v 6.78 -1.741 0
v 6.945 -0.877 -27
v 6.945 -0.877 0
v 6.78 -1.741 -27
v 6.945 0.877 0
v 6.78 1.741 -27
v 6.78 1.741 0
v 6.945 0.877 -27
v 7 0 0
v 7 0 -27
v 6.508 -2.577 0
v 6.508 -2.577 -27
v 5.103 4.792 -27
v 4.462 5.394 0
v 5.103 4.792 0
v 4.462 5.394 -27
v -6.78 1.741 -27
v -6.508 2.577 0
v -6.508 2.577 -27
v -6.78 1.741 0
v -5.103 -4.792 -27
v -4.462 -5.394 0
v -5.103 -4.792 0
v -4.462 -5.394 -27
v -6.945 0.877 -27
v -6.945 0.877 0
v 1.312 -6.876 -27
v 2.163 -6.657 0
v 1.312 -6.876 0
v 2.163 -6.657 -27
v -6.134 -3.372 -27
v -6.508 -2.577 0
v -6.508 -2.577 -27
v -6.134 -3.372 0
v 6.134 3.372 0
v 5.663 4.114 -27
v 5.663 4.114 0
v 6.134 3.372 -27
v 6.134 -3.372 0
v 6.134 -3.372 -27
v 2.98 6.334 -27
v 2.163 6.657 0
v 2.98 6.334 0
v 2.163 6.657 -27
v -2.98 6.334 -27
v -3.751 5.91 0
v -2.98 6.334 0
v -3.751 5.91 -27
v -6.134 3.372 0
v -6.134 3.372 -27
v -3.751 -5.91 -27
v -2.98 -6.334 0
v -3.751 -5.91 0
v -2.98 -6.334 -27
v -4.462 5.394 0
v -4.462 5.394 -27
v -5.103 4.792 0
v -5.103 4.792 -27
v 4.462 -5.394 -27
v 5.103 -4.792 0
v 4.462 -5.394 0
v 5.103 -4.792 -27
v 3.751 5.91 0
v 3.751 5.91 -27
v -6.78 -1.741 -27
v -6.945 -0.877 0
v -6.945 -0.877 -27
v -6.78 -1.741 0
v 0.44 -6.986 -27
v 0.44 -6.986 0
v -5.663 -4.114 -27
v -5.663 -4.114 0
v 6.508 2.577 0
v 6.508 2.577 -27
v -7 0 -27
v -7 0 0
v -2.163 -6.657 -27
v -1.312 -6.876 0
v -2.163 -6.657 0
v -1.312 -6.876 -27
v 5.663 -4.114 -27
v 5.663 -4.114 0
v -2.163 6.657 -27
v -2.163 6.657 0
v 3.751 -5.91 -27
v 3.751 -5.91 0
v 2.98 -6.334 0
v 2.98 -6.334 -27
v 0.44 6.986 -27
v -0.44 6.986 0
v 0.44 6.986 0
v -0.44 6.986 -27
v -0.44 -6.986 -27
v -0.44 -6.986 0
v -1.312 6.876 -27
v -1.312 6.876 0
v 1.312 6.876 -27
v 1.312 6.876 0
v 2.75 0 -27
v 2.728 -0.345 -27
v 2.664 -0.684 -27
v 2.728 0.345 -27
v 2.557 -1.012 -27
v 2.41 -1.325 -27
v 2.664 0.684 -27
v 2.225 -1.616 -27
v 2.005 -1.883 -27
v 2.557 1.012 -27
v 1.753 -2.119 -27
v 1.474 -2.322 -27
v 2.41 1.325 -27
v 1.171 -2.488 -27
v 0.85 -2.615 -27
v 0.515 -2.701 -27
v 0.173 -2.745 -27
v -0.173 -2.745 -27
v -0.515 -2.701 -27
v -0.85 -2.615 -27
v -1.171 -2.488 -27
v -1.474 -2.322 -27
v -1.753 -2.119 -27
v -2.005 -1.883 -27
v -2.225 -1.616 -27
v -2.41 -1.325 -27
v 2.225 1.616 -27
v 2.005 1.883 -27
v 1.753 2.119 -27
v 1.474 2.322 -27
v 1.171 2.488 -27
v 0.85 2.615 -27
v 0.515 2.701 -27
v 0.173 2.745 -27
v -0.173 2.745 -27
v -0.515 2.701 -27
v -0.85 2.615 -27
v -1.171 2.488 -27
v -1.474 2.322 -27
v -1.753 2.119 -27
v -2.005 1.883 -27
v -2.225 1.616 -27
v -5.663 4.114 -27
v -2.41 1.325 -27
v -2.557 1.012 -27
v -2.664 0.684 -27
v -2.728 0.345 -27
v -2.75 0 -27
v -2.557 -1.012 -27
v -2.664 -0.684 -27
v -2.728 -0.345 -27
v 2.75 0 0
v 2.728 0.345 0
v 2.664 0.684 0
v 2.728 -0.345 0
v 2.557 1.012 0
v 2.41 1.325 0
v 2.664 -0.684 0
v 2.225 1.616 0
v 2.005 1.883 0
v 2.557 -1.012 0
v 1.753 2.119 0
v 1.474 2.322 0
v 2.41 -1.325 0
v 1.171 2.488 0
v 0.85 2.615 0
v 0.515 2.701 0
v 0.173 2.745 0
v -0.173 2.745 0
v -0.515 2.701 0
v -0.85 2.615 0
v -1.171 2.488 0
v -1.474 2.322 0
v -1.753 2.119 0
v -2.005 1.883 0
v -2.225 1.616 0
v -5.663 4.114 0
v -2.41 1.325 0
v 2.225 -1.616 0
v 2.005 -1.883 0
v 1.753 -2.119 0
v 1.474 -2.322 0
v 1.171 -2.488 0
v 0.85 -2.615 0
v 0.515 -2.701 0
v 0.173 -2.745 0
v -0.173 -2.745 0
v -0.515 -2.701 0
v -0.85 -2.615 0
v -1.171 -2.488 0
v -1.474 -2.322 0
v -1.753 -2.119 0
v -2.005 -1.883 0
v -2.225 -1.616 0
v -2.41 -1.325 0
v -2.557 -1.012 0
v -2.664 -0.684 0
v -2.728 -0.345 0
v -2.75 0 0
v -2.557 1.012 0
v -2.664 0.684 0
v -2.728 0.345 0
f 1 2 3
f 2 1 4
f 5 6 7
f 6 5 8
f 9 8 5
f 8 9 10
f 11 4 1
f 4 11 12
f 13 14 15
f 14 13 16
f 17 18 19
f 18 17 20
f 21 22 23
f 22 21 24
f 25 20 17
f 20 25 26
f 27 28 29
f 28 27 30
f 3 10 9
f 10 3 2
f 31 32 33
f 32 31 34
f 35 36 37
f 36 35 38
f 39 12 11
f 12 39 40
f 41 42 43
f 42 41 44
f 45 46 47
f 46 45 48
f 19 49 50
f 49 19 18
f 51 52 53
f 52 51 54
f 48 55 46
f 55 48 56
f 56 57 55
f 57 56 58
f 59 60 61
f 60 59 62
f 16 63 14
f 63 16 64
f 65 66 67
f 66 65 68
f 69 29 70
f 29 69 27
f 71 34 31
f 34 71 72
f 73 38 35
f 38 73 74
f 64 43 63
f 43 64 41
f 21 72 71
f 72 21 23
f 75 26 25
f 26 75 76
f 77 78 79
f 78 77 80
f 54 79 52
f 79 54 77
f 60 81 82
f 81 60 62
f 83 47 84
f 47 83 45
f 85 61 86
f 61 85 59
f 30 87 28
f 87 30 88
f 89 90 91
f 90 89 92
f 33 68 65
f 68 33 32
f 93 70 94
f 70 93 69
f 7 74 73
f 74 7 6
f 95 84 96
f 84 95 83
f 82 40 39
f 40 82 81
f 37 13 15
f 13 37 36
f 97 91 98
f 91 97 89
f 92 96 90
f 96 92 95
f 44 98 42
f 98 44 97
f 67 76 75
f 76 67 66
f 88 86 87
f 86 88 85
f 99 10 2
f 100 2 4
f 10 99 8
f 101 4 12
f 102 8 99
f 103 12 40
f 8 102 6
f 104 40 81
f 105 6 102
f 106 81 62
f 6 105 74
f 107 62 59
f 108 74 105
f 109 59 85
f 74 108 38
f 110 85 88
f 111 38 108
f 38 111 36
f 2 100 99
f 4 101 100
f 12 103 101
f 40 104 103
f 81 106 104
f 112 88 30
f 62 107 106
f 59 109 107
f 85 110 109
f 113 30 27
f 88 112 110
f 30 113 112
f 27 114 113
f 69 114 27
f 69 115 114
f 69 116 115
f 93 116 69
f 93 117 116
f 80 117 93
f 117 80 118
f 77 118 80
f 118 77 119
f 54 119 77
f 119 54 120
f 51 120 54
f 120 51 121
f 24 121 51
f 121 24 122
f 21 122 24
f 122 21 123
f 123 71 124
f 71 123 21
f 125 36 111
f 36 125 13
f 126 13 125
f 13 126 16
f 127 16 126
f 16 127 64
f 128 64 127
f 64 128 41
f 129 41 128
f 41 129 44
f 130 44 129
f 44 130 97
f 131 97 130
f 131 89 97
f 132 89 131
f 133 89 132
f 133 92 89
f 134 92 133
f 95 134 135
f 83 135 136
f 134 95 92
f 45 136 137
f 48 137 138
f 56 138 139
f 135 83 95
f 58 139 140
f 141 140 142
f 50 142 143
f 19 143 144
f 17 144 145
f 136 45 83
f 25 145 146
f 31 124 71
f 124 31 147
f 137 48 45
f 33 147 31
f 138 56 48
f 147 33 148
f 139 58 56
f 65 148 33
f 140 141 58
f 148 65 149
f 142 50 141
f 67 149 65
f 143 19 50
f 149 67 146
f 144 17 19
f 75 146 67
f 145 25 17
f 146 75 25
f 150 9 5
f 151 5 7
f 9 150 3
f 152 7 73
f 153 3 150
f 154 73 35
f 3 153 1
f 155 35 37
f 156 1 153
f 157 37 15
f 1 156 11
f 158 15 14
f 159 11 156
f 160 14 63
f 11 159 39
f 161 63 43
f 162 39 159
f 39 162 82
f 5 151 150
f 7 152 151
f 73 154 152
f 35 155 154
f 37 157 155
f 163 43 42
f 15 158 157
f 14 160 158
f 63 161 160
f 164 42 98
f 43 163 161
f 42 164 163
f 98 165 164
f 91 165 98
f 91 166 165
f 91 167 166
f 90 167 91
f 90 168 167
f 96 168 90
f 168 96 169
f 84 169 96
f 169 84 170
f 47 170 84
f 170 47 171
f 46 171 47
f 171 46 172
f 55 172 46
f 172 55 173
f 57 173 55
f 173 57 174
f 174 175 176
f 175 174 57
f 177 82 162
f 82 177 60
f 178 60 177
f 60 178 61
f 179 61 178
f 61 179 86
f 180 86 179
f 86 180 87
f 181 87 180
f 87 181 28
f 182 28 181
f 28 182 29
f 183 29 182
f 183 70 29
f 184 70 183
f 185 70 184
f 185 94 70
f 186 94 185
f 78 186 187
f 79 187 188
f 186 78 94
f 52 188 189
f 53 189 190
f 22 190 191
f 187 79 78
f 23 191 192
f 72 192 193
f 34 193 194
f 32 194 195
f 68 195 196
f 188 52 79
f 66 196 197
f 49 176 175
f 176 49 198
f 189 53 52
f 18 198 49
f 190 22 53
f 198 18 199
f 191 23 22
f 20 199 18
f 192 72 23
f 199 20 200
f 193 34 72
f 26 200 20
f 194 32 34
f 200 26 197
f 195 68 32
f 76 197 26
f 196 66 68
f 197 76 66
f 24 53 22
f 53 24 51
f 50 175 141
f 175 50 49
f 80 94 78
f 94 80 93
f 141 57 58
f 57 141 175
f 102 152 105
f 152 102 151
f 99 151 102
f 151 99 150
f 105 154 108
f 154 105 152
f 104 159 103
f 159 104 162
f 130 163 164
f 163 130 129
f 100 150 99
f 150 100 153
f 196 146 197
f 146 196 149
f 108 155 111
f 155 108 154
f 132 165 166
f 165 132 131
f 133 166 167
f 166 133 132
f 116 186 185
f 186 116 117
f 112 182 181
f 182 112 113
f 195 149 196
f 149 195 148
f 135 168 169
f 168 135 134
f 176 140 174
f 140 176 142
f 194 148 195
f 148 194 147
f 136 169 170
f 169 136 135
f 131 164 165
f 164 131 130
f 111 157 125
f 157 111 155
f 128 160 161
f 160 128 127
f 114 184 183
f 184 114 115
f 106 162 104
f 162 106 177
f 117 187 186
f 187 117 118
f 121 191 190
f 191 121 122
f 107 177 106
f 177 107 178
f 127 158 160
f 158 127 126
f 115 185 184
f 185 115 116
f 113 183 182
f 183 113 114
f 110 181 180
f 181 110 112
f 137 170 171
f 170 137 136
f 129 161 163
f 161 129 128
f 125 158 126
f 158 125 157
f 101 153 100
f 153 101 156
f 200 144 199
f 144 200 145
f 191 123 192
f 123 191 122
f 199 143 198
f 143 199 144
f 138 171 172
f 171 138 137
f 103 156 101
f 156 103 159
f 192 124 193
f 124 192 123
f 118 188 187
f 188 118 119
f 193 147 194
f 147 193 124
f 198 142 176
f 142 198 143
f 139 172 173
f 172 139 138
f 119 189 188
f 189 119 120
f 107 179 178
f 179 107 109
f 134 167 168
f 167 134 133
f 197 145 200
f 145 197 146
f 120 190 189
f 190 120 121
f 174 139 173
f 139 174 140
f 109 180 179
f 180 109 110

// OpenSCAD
$fn = 50;


difference() {
	union() {
		translate(v = [0, 0, -27.0000000000]) {
			cylinder(h = 27, r = 7.0000000000);
		}
		cylinder(h = 0, r = 10.0000000000);
	}
	union() {
		#translate(v = [0, 0, -27]) {
			cylinder(h = 27, r = 2.7500000000);
		}
	}
}
